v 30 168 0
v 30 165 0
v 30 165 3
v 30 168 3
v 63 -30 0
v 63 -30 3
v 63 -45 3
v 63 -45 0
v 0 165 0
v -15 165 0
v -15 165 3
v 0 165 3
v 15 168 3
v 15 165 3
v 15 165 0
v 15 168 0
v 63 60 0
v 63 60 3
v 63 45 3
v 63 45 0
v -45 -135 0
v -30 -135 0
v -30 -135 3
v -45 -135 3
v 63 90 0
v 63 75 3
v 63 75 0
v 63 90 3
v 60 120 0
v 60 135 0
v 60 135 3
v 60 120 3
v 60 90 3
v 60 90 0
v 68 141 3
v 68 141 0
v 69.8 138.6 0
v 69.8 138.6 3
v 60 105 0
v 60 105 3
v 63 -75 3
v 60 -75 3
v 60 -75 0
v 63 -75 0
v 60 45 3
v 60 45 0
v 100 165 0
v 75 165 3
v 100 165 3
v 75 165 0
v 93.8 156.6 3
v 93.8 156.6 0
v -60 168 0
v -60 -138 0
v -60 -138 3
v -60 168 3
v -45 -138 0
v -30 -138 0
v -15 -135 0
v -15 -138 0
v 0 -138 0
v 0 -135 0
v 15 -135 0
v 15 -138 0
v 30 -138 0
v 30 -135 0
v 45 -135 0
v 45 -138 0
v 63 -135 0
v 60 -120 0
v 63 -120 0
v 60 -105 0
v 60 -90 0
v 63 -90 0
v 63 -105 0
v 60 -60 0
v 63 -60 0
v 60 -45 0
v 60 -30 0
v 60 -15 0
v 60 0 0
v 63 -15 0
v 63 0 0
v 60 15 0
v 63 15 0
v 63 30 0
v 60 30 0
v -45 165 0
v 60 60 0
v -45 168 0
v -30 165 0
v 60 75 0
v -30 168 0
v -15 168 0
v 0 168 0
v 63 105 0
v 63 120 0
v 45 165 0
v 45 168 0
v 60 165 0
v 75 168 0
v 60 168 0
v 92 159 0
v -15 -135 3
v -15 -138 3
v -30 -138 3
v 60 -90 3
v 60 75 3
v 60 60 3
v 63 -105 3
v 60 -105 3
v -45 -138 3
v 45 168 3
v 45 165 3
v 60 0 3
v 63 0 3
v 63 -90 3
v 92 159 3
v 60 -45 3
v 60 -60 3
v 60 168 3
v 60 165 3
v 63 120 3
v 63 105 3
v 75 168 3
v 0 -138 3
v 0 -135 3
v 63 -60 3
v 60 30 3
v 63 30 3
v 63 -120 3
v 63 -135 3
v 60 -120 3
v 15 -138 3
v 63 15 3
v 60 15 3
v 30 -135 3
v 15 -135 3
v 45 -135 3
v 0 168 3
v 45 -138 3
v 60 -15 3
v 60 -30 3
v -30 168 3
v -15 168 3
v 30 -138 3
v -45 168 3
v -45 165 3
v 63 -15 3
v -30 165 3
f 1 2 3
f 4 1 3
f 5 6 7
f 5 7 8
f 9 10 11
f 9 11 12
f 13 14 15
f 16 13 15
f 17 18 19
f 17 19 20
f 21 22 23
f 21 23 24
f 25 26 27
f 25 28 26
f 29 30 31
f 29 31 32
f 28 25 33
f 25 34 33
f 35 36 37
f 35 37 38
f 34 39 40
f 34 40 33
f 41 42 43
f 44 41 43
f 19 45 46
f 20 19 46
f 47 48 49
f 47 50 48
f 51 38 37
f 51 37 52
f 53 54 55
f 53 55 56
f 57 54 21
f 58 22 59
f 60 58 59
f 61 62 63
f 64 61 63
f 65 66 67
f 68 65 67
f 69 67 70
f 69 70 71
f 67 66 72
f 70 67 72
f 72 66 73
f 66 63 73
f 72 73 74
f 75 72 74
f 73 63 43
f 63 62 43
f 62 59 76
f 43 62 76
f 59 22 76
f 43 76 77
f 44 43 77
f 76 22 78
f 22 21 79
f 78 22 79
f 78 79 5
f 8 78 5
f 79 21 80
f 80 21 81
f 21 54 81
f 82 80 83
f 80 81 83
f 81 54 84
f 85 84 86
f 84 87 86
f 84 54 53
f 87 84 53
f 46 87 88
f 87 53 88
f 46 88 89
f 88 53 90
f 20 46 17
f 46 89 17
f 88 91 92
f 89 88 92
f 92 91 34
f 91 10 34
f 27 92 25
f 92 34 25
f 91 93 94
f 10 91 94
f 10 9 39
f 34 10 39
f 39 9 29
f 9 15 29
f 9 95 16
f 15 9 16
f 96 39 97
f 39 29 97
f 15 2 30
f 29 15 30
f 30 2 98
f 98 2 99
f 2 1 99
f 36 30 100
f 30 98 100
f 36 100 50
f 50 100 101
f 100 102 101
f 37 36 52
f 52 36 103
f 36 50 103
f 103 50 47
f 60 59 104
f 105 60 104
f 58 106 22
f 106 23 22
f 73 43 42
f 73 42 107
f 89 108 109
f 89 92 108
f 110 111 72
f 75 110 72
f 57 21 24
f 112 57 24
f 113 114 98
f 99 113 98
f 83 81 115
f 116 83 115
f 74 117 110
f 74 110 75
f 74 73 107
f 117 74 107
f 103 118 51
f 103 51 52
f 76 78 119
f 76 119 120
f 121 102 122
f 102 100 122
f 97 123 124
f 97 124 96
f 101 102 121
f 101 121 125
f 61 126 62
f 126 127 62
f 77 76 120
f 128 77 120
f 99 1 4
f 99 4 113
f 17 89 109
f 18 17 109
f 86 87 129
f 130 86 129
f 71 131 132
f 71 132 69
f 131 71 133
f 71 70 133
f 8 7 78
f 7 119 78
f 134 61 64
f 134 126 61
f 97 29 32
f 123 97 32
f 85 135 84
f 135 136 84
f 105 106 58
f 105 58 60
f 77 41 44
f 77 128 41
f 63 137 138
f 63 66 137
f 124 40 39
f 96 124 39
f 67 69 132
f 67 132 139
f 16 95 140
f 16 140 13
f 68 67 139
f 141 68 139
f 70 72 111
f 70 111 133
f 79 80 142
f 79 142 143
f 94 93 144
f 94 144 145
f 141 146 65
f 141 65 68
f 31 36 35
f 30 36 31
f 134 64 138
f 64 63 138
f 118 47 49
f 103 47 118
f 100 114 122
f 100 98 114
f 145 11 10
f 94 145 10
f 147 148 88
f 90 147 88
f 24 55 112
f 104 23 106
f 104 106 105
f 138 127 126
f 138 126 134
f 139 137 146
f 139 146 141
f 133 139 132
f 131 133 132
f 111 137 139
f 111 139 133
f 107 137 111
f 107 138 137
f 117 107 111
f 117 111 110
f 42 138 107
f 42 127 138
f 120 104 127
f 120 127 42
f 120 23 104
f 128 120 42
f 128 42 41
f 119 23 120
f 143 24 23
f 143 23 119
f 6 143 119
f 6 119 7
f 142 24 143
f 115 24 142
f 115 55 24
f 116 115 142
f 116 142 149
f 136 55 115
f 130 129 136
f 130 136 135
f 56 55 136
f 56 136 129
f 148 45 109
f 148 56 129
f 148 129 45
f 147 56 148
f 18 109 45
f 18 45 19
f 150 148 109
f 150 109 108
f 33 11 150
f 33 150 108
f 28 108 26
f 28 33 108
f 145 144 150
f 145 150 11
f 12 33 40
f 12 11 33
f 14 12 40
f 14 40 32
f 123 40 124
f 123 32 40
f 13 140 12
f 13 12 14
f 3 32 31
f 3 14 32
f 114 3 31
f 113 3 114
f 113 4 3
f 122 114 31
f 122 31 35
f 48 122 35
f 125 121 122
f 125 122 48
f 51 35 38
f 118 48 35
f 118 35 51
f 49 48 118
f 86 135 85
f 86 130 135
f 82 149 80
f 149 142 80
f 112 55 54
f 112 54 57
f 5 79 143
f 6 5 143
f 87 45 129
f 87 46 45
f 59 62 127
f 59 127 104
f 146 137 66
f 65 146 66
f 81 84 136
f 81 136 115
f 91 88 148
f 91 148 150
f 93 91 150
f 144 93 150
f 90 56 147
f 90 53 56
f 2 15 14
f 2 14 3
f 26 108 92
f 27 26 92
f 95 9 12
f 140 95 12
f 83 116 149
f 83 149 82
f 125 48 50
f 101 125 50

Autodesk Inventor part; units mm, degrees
ref_plane "YZ Plane" through (0, 0, 0) normal (1, 0, 0) x (0, 1, 0)
ref_plane "XZ Plane" through (0, 0, 0) normal (0, 1, 0) x (-1, 0, 0)
ref_plane "XY Plane" through (0, 0, 0) normal (0, 0, 1) x (1, 0, 0)
sketch "Esboço1" plane through (0, 0, 0) normal (0, 0, 1) x (1, 0, 0)
  line L0 (60, -135) -> (-60, -135)
  line L1 (-60, -135) -> (-60, 135)
  line L2 (-60, 135) -> (60, 135)
  line L3 (60, 135) -> (60, -135)
  line L4 (60, -135) -> (-60, 135) construction
  line L5 (-60, -135) -> (60, 135) construction
  line L6 (-60, 135) -> (60, 135)
  line L7 (60, 135) -> (60, 165)
  line L8 (60, 165) -> (-60, 165)
  line L9 (-60, 165) -> (-60, 135)
  line L10 (60, 165) -> (100, 165)
  line L11 (100, 165) -> (60, 135)
  point P0 (0, 0)
  dimension "d0" = 120
  dimension "d1" = 270
  dimension "d2" = 120
  dimension "d3" = 30
  dimension "d4" = 40
extrude "Extrusão1" add sketch "Esboço1" along normal blind 3
sketch "Esboço2" plane through (60, -135, 0) normal (1, 0, 0) x (0, 0, -1)
  line L0 (-3, 0) -> (0, 0)
  line L1 (0, 0) -> (0, 15)
  line L2 (0, 15) -> (-3, 15)
  line L3 (-3, 15) -> (-3, 0)
  line L4 (-3, 30) -> (0, 30)
  line L5 (0, 30) -> (0, 45)
  line L6 (0, 45) -> (-3, 45)
  line L7 (-3, 45) -> (-3, 30)
  line L8 (-3, 60) -> (0, 60)
  line L9 (0, 60) -> (0, 75)
  line L10 (0, 75) -> (-3, 75)
  line L11 (-3, 75) -> (-3, 60)
  line L12 (-3, 90) -> (0, 90)
  line L13 (0, 90) -> (0, 105)
  line L14 (0, 105) -> (-3, 105)
  line L15 (-3, 105) -> (-3, 90)
  line L16 (-3, 120) -> (0, 120)
  line L17 (0, 120) -> (0, 135)
  line L18 (0, 135) -> (-3, 135)
  line L19 (-3, 135) -> (-3, 120)
  line L20 (-3, 150) -> (0, 150)
  line L21 (0, 150) -> (0, 165)
  line L22 (0, 165) -> (-3, 165)
  line L23 (-3, 165) -> (-3, 150)
  line L24 (-3, 180) -> (0, 180)
  line L25 (0, 180) -> (0, 195)
  line L26 (0, 195) -> (-3, 195)
  line L27 (-3, 195) -> (-3, 180)
  line L28 (-3, 210) -> (0, 210)
  line L29 (0, 210) -> (0, 225)
  line L30 (0, 225) -> (-3, 225)
  line L31 (-3, 225) -> (-3, 210)
  line L32 (-3, 240) -> (0, 240)
  line L33 (0, 240) -> (0, 255)
  line L34 (0, 255) -> (-3, 255)
  line L35 (-3, 255) -> (-3, 240)
  dimension "d7" = 3
  dimension "d8" = 15
  dimension "d11" = 30
sketch "Esboço3" plane through (-60, -135, 0) normal (0, -1, 0) x (1, 0, 0)
  line L0 (160, 3) -> (0, 3) projected
  line L1 (0, 0) -> (15, 0)
  line L2 (15, 0) -> (15, 3)
  line L3 (15, 3) -> (0, 3)
  line L4 (0, 3) -> (0, 0)
  line L5 (30, 0) -> (45, 0)
  line L6 (45, 0) -> (45, 3)
  line L7 (45, 3) -> (30, 3)
  line L8 (60, 0) -> (75, 0)
  line L9 (75, 0) -> (75, 3)
  line L10 (75, 3) -> (60, 3)
  line L11 (90, 0) -> (105, 0)
  line L12 (105, 0) -> (105, 3)
  line L13 (105, 3) -> (90, 3)
  line L14 (30, 0) -> (45, 0)
  line L15 (45, 3) -> (30, 3)
  line L16 (45, 0) -> (45, 3)
  line L17 (30, 3) -> (30, 0)
  line L18 (60, 0) -> (75, 0)
  line L19 (75, 3) -> (60, 3)
  line L20 (75, 0) -> (75, 3)
  line L21 (60, 3) -> (60, 0)
  line L22 (90, 0) -> (105, 0)
  line L23 (105, 3) -> (90, 3)
  line L24 (105, 0) -> (105, 3)
  line L25 (90, 3) -> (90, 0)
  dimension "d16" = 15
  dimension "d17" = 3
  dimension "d20" = 30
  dimension "d27" = 30
sketch "Esboço4" plane through (-60, 165, 0) normal (0, 1, 0) x (1, 0, 0)
  line L0 (160, -3) -> (0, -3) projected
  line L1 (0, -3) -> (15, -3)
  line L2 (15, -3) -> (15, 0)
  line L3 (15, 0) -> (0, 0)
  line L4 (0, 0) -> (0, -3)
  line L5 (30, -3) -> (45, -3)
  line L6 (45, -3) -> (45, 0)
  line L7 (45, 0) -> (30, 0)
  line L8 (30, 0) -> (30, -3)
  line L9 (60, -3) -> (75, -3)
  line L10 (75, -3) -> (75, 0)
  line L11 (75, 0) -> (60, 0)
  line L12 (60, 0) -> (60, -3)
  line L13 (90, -3) -> (105, -3)
  line L14 (105, -3) -> (105, 0)
  line L15 (105, 0) -> (90, 0)
  line L16 (90, 0) -> (90, -3)
  line L17 (120, -3) -> (135, -3)
  line L18 (135, -3) -> (135, 0)
  line L19 (135, 0) -> (120, 0)
  line L20 (120, 0) -> (120, -3)
  point P0 (15, -3)
  dimension "d32" = 15
  dimension "d33" = 3
  dimension "d43" = 30
sketch "Esboço5" plane through (100, 165, 0) normal (0.6, -0.8, 0) x (0.8, 0.6, 0)
  line L0 (0, 0) -> (-128, 0) projected
  line L1 (0, 0) -> (-10, 0)
  line L2 (-50, 0) -> (0, 0) projected
  line L3 (-10, 0) -> (-40, 0)
  line L4 (-40, 0) -> (-40, 3)
  line L5 (-40, 3) -> (-10, 3)
  line L6 (-10, 3) -> (-10, 0)
  point P0 (-179, 0)
  point P1 (-40, 0)
  dimension "d34" = 10
  dimension "d35" = 30
  dimension "d36" = 3
extrude "Extrusão2" add sketch "Esboço2" along normal blind 3
extrude "Extrusão3" add sketch "Esboço3" along normal blind 3
extrude "Extrusão4" add sketch "Esboço4" along normal blind 3
extrude "Extrusão5" add sketch "Esboço5" along normal blind 3
equation "\"d16\" = d8"
equation "\"d17\" = d7"
equation "\"d32\" = d16"
equation "\"d33\" = d17"
equation "\"d36\" = d33"
properties part number "side"
